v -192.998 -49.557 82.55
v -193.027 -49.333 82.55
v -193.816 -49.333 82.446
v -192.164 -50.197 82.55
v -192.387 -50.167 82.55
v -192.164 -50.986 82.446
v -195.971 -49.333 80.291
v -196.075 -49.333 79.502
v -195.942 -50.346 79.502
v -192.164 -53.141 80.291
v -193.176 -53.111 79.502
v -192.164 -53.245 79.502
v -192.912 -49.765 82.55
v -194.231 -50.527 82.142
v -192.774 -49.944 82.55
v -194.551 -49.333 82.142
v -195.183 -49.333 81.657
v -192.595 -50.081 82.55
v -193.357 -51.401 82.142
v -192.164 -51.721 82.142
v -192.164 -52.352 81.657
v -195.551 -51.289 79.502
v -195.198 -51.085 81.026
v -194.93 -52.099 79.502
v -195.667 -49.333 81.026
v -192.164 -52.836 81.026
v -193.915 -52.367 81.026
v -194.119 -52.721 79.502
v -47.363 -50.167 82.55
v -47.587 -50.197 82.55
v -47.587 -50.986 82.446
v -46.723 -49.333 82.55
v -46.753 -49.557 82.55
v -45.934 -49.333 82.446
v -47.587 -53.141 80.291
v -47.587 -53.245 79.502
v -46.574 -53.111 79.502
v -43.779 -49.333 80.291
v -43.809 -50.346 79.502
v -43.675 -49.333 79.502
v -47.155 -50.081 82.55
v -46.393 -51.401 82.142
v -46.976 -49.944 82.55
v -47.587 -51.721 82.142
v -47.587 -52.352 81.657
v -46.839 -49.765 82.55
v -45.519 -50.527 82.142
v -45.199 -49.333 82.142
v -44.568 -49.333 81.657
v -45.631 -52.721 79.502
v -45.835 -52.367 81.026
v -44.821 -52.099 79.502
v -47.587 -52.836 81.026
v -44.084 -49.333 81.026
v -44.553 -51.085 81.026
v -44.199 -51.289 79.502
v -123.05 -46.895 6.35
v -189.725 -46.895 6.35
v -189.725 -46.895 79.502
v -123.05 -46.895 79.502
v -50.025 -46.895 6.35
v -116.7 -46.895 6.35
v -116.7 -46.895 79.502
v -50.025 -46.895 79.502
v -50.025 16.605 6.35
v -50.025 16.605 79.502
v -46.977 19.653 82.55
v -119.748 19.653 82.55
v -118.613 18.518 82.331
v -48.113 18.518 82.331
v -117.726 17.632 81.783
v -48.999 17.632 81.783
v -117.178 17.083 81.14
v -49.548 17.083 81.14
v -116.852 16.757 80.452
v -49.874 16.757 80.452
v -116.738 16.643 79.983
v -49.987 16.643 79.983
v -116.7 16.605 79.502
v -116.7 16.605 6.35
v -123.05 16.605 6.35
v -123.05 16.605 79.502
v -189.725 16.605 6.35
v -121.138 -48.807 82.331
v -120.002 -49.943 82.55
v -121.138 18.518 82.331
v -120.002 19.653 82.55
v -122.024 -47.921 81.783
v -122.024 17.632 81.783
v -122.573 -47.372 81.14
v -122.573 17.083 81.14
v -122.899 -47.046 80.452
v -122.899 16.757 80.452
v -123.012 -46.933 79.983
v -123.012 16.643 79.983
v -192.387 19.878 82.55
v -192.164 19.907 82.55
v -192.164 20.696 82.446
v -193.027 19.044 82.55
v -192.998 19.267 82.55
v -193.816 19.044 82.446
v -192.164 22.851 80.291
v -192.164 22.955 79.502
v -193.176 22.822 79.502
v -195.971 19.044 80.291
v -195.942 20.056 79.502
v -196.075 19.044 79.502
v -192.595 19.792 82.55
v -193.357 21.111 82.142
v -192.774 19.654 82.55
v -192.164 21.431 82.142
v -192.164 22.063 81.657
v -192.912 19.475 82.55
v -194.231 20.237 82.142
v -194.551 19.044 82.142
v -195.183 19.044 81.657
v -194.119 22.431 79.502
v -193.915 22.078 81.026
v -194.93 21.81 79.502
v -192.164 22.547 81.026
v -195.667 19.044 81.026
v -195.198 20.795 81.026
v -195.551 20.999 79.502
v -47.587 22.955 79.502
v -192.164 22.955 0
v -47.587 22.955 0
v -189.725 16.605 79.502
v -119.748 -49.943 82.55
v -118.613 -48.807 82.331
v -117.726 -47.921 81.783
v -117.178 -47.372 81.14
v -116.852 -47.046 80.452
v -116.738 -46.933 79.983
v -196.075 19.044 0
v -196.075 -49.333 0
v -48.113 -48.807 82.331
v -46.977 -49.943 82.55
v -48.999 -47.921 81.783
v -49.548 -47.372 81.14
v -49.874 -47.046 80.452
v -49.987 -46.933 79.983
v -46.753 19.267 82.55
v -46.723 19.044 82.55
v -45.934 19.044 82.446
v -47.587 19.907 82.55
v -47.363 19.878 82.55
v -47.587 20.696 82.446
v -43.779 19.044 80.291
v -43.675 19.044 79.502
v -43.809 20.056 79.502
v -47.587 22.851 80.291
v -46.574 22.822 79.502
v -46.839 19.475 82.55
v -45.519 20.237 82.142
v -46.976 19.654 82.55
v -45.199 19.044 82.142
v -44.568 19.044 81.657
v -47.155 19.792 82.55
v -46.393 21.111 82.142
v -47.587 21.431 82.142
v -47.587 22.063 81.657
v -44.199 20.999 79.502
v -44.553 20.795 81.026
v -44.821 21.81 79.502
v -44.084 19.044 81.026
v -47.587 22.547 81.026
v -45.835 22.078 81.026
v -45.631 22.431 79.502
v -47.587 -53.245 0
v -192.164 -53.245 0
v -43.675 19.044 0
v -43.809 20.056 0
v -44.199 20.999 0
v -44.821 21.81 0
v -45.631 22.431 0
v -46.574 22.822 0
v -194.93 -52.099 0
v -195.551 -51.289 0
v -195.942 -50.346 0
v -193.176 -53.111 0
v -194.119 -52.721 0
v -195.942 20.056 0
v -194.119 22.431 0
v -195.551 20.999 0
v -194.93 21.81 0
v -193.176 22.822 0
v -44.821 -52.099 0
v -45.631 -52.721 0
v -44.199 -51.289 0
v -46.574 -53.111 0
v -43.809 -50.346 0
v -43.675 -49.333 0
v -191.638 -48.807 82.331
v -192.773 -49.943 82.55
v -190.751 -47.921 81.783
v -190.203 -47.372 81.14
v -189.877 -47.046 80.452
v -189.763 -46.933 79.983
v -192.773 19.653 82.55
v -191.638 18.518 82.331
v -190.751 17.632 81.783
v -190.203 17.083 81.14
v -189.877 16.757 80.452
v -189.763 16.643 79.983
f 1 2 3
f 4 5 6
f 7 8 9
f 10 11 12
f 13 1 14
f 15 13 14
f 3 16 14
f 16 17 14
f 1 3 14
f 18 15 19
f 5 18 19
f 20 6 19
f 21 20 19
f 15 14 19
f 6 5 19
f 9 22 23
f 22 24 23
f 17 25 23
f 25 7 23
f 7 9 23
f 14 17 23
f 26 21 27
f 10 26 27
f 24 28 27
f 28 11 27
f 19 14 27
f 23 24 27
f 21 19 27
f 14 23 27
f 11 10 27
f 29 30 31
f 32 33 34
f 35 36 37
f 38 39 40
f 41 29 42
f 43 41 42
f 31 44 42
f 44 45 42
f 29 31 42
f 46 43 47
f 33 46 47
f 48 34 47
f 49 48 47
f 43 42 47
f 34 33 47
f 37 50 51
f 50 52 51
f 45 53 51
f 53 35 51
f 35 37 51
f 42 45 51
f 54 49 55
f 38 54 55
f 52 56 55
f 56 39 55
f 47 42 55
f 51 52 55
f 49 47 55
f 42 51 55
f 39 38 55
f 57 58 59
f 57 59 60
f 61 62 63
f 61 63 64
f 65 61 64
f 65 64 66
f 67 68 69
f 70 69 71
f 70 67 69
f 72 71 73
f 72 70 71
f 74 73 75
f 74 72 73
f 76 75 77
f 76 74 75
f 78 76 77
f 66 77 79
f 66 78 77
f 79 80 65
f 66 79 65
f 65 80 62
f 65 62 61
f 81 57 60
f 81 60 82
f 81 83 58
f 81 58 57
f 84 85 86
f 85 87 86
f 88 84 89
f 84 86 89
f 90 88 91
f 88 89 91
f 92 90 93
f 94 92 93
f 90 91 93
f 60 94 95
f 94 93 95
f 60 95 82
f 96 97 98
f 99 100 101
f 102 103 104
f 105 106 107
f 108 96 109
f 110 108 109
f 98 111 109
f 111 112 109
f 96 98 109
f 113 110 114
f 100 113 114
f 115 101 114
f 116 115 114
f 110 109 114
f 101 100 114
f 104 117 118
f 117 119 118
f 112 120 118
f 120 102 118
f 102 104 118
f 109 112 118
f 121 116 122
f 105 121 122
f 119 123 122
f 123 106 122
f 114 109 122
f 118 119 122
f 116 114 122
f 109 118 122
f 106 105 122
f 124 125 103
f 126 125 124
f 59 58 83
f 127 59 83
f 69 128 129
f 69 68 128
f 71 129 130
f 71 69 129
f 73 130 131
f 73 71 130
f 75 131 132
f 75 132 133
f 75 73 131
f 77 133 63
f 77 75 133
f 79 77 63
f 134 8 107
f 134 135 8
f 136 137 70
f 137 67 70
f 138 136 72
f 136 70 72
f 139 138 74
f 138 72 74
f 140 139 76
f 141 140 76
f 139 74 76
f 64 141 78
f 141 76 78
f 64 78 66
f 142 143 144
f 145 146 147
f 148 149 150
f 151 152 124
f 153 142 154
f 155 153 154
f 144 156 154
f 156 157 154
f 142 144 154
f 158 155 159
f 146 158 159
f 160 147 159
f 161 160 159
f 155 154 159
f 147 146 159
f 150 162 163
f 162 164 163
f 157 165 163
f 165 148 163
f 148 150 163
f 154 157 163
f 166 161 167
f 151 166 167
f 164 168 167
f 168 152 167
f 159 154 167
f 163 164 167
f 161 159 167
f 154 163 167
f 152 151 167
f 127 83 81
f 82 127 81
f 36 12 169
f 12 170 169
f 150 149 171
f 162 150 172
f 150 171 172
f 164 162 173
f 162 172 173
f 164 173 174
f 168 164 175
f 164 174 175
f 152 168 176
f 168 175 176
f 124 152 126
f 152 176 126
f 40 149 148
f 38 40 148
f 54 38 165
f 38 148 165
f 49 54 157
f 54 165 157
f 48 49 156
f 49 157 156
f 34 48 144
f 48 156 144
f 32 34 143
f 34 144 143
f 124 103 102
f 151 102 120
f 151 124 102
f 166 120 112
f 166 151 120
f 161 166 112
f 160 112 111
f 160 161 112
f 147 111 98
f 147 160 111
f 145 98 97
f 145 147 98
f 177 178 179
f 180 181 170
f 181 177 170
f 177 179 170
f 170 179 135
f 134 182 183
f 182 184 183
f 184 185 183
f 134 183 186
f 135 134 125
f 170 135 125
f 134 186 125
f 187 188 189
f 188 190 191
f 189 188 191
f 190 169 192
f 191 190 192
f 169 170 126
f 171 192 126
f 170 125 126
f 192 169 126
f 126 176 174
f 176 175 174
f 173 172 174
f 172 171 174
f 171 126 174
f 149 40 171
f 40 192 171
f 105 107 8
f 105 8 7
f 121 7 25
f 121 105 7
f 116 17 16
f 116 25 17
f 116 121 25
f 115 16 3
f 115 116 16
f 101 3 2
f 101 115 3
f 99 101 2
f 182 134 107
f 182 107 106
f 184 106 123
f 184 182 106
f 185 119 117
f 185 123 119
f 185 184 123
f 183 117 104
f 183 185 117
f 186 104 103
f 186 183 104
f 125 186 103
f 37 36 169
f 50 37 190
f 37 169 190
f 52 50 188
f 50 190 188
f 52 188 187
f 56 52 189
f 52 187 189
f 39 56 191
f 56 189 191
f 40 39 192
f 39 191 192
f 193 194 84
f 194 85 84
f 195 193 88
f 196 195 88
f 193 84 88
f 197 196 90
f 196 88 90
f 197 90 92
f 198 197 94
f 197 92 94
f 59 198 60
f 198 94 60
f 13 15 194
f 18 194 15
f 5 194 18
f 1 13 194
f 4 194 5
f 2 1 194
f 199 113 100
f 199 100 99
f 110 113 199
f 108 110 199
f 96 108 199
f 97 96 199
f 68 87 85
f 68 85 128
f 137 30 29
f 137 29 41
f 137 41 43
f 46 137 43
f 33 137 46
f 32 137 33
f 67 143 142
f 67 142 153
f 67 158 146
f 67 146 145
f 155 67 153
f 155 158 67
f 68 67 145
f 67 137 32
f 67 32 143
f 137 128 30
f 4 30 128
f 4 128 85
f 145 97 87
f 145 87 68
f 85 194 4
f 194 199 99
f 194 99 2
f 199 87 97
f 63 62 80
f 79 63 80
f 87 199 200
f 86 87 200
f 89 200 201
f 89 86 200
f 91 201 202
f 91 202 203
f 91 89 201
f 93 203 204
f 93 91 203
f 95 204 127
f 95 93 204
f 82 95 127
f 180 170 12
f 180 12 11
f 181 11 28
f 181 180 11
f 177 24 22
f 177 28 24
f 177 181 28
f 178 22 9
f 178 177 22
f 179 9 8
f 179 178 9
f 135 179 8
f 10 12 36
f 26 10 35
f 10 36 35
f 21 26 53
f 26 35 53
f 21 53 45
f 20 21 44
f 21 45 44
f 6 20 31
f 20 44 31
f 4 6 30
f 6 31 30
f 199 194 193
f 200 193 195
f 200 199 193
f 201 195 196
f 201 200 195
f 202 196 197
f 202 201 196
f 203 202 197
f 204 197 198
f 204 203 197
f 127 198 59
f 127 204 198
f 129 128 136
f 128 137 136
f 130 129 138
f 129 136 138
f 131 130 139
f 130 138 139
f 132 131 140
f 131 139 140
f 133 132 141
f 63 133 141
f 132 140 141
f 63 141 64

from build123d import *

# Parameters (mm, degrees)
F0_W         = 152.4
F0_H         = 76.2
F1_DEPTH     = 6.35
F2_W         = 152.4
F2_H         = 76.2
F2_W_2       = 66.675
F2_H_2       = 63.5
F3_DEPTH     = 76.2
F4_R         = 3.048
F5_T1_DEPTH  = 92.329
F5_T4_ANGLE  = 90
F5_T6_ANGLE  = 90
F5_T8_ANGLE  = 90
F5_T10_ANGLE = 90


# Not quite as in the source:
# - a fillet or chamfer that OpenCascade refuses, or shapes differently, is made with other operations: its cross-section is extruded or revolved along the edge and cut away or added
# - a feature names something its author has since deleted; it is built from what else it names


with BuildPart() as f1:
    # F0 (on Top) → F1 (new body)
    with BuildSketch(Plane.XY):
        with Locations((-119.875261867, -15.1447099686)):
            Rectangle(F0_W, F0_H)
    extrude(amount=F1_DEPTH)

    # F2 (on face) → F3 (join)
    with BuildSketch(Plane.XY.offset(6.35)):
        with Locations((-119.875261867, -15.1447099686)):
            Rectangle(F2_W, F2_H)
        with Locations((-156.387761867, -15.1447099686)):
            Rectangle(F2_W_2, F2_H_2, mode=Mode.SUBTRACT)
        with Locations((-83.362761867, -15.1447099686)):
            Rectangle(F2_W_2, F2_H_2, mode=Mode.SUBTRACT)
    extrude(amount=F3_DEPTH)

    # F4
    f4_edges = [f1.edges().sort_by_distance(p)[0] for p in [
        (-196.075262, -15.14471, 82.55),
        (-119.875262, 22.95529, 82.55),
        (-43.675262, -15.14471, 82.55),
        (-119.875262, -53.24471, 82.55),
        (-123.050262, -15.14471, 82.55),
        (-156.387762, -46.89471, 82.55),
        (-189.725262, -15.14471, 82.55),
        (-156.387762, 16.60529, 82.55),
        (-83.362762, 16.60529, 82.55),
        (-50.025262, -15.14471, 82.55),
        (-83.362762, -46.89471, 82.55),
        (-116.700262, -15.14471, 82.55),
    ]]
    fillet(f4_edges, radius=F4_R)

    # F5: fillet of radius 3.9116 on 4 edges, made by hand

    # F5_s2 → F5_t1 (cut)
    with BuildSketch(Plane.XY.offset(-9.779)):
        with BuildLine():
            ThreePointArc((-47.586861867, -53.2447099686), (-44.8209429818, -52.0990288539), (-43.675261867, -49.3331099686))
            Line((-43.675261867, -49.3331099686), (-43.675261867, -53.2447099686))
            Line((-43.675261867, -53.2447099686), (-47.586861867, -53.2447099686))
        make_face()
        with BuildLine():
            ThreePointArc((-43.675261867, 19.0436900314), (-44.8209429818, 21.8096089167), (-47.586861867, 22.9552900314))
            Line((-47.586861867, 22.9552900314), (-43.675261867, 22.9552900314))
            Line((-43.675261867, 22.9552900314), (-43.675261867, 19.0436900314))
        make_face()
        with BuildLine():
            ThreePointArc((-192.163661867, -53.2447099686), (-194.9295807523, -52.0990288539), (-196.075261867, -49.3331099686))
            Line((-196.075261867, -49.3331099686), (-196.075261867, -53.2447099686))
            Line((-196.075261867, -53.2447099686), (-192.163661867, -53.2447099686))
        make_face()
        with BuildLine():
            ThreePointArc((-196.075261867, 19.0436900314), (-194.9295807523, 21.8096089167), (-192.163661867, 22.9552900314))
            Line((-192.163661867, 22.9552900314), (-196.075261867, 22.9552900314))
            Line((-196.075261867, 22.9552900314), (-196.075261867, 19.0436900314))
        make_face()
    extrude(amount=F5_T1_DEPTH, mode=Mode.SUBTRACT)

    # F5_s3 → F5_t4 (revolve, cut)
    with BuildSketch(Plane.YZ.offset(-192.163661867)):
        with BuildLine():
            ThreePointArc((19.9072900314, 82.55), (22.0625515005, 81.6572614691), (22.9552900314, 79.502))
            Line((22.9552900314, 79.502), (22.9552900314, 82.55))
            Line((22.9552900314, 82.55), (19.9072900314, 82.55))
        make_face()
    revolve(axis=Axis((-192.163661867, 19.0436900314, 82.55), (0, 0, 1)), revolution_arc=F5_T4_ANGLE, mode=Mode.SUBTRACT)

    # F5_s5 → F5_t6 (revolve, cut)
    with BuildSketch(Plane.XZ.offset(49.3331099686)):
        with BuildLine():
            ThreePointArc((-193.027261867, 82.55), (-195.1825233361, 81.6572614691), (-196.075261867, 79.502))
            Line((-196.075261867, 79.502), (-196.075261867, 82.55))
            Line((-196.075261867, 82.55), (-193.027261867, 82.55))
        make_face()
    revolve(axis=Axis((-192.163661867, -49.3331099686, 82.55), (0, 0, 1)), revolution_arc=F5_T6_ANGLE, mode=Mode.SUBTRACT)

    # F5_s7 → F5_t8 (revolve, cut)
    with BuildSketch(Plane.XZ.offset(-19.0436900314)):
        with BuildLine():
            ThreePointArc((-46.723261867, 82.55), (-44.568000398, 81.6572614691), (-43.675261867, 79.502))
            Line((-43.675261867, 79.502), (-43.675261867, 82.55))
            Line((-43.675261867, 82.55), (-46.723261867, 82.55))
        make_face()
    revolve(axis=Axis((-47.586861867, 19.0436900314, 82.55), (0, 0, 1)), revolution_arc=F5_T8_ANGLE, mode=Mode.SUBTRACT)

    # F5_s9 → F5_t10 (revolve, cut)
    with BuildSketch(Plane.YZ.offset(-47.586861867)):
        with BuildLine():
            ThreePointArc((-50.1967099686, 82.55), (-52.3519714376, 81.6572614691), (-53.2447099686, 79.502))
            Line((-53.2447099686, 79.502), (-53.2447099686, 82.55))
            Line((-53.2447099686, 82.55), (-50.1967099686, 82.55))
        make_face()
    revolve(axis=Axis((-47.586861867, -49.3331099686, 82.55), (0, 0, 1)), revolution_arc=F5_T10_ANGLE, mode=Mode.SUBTRACT)


solid = f1.part
